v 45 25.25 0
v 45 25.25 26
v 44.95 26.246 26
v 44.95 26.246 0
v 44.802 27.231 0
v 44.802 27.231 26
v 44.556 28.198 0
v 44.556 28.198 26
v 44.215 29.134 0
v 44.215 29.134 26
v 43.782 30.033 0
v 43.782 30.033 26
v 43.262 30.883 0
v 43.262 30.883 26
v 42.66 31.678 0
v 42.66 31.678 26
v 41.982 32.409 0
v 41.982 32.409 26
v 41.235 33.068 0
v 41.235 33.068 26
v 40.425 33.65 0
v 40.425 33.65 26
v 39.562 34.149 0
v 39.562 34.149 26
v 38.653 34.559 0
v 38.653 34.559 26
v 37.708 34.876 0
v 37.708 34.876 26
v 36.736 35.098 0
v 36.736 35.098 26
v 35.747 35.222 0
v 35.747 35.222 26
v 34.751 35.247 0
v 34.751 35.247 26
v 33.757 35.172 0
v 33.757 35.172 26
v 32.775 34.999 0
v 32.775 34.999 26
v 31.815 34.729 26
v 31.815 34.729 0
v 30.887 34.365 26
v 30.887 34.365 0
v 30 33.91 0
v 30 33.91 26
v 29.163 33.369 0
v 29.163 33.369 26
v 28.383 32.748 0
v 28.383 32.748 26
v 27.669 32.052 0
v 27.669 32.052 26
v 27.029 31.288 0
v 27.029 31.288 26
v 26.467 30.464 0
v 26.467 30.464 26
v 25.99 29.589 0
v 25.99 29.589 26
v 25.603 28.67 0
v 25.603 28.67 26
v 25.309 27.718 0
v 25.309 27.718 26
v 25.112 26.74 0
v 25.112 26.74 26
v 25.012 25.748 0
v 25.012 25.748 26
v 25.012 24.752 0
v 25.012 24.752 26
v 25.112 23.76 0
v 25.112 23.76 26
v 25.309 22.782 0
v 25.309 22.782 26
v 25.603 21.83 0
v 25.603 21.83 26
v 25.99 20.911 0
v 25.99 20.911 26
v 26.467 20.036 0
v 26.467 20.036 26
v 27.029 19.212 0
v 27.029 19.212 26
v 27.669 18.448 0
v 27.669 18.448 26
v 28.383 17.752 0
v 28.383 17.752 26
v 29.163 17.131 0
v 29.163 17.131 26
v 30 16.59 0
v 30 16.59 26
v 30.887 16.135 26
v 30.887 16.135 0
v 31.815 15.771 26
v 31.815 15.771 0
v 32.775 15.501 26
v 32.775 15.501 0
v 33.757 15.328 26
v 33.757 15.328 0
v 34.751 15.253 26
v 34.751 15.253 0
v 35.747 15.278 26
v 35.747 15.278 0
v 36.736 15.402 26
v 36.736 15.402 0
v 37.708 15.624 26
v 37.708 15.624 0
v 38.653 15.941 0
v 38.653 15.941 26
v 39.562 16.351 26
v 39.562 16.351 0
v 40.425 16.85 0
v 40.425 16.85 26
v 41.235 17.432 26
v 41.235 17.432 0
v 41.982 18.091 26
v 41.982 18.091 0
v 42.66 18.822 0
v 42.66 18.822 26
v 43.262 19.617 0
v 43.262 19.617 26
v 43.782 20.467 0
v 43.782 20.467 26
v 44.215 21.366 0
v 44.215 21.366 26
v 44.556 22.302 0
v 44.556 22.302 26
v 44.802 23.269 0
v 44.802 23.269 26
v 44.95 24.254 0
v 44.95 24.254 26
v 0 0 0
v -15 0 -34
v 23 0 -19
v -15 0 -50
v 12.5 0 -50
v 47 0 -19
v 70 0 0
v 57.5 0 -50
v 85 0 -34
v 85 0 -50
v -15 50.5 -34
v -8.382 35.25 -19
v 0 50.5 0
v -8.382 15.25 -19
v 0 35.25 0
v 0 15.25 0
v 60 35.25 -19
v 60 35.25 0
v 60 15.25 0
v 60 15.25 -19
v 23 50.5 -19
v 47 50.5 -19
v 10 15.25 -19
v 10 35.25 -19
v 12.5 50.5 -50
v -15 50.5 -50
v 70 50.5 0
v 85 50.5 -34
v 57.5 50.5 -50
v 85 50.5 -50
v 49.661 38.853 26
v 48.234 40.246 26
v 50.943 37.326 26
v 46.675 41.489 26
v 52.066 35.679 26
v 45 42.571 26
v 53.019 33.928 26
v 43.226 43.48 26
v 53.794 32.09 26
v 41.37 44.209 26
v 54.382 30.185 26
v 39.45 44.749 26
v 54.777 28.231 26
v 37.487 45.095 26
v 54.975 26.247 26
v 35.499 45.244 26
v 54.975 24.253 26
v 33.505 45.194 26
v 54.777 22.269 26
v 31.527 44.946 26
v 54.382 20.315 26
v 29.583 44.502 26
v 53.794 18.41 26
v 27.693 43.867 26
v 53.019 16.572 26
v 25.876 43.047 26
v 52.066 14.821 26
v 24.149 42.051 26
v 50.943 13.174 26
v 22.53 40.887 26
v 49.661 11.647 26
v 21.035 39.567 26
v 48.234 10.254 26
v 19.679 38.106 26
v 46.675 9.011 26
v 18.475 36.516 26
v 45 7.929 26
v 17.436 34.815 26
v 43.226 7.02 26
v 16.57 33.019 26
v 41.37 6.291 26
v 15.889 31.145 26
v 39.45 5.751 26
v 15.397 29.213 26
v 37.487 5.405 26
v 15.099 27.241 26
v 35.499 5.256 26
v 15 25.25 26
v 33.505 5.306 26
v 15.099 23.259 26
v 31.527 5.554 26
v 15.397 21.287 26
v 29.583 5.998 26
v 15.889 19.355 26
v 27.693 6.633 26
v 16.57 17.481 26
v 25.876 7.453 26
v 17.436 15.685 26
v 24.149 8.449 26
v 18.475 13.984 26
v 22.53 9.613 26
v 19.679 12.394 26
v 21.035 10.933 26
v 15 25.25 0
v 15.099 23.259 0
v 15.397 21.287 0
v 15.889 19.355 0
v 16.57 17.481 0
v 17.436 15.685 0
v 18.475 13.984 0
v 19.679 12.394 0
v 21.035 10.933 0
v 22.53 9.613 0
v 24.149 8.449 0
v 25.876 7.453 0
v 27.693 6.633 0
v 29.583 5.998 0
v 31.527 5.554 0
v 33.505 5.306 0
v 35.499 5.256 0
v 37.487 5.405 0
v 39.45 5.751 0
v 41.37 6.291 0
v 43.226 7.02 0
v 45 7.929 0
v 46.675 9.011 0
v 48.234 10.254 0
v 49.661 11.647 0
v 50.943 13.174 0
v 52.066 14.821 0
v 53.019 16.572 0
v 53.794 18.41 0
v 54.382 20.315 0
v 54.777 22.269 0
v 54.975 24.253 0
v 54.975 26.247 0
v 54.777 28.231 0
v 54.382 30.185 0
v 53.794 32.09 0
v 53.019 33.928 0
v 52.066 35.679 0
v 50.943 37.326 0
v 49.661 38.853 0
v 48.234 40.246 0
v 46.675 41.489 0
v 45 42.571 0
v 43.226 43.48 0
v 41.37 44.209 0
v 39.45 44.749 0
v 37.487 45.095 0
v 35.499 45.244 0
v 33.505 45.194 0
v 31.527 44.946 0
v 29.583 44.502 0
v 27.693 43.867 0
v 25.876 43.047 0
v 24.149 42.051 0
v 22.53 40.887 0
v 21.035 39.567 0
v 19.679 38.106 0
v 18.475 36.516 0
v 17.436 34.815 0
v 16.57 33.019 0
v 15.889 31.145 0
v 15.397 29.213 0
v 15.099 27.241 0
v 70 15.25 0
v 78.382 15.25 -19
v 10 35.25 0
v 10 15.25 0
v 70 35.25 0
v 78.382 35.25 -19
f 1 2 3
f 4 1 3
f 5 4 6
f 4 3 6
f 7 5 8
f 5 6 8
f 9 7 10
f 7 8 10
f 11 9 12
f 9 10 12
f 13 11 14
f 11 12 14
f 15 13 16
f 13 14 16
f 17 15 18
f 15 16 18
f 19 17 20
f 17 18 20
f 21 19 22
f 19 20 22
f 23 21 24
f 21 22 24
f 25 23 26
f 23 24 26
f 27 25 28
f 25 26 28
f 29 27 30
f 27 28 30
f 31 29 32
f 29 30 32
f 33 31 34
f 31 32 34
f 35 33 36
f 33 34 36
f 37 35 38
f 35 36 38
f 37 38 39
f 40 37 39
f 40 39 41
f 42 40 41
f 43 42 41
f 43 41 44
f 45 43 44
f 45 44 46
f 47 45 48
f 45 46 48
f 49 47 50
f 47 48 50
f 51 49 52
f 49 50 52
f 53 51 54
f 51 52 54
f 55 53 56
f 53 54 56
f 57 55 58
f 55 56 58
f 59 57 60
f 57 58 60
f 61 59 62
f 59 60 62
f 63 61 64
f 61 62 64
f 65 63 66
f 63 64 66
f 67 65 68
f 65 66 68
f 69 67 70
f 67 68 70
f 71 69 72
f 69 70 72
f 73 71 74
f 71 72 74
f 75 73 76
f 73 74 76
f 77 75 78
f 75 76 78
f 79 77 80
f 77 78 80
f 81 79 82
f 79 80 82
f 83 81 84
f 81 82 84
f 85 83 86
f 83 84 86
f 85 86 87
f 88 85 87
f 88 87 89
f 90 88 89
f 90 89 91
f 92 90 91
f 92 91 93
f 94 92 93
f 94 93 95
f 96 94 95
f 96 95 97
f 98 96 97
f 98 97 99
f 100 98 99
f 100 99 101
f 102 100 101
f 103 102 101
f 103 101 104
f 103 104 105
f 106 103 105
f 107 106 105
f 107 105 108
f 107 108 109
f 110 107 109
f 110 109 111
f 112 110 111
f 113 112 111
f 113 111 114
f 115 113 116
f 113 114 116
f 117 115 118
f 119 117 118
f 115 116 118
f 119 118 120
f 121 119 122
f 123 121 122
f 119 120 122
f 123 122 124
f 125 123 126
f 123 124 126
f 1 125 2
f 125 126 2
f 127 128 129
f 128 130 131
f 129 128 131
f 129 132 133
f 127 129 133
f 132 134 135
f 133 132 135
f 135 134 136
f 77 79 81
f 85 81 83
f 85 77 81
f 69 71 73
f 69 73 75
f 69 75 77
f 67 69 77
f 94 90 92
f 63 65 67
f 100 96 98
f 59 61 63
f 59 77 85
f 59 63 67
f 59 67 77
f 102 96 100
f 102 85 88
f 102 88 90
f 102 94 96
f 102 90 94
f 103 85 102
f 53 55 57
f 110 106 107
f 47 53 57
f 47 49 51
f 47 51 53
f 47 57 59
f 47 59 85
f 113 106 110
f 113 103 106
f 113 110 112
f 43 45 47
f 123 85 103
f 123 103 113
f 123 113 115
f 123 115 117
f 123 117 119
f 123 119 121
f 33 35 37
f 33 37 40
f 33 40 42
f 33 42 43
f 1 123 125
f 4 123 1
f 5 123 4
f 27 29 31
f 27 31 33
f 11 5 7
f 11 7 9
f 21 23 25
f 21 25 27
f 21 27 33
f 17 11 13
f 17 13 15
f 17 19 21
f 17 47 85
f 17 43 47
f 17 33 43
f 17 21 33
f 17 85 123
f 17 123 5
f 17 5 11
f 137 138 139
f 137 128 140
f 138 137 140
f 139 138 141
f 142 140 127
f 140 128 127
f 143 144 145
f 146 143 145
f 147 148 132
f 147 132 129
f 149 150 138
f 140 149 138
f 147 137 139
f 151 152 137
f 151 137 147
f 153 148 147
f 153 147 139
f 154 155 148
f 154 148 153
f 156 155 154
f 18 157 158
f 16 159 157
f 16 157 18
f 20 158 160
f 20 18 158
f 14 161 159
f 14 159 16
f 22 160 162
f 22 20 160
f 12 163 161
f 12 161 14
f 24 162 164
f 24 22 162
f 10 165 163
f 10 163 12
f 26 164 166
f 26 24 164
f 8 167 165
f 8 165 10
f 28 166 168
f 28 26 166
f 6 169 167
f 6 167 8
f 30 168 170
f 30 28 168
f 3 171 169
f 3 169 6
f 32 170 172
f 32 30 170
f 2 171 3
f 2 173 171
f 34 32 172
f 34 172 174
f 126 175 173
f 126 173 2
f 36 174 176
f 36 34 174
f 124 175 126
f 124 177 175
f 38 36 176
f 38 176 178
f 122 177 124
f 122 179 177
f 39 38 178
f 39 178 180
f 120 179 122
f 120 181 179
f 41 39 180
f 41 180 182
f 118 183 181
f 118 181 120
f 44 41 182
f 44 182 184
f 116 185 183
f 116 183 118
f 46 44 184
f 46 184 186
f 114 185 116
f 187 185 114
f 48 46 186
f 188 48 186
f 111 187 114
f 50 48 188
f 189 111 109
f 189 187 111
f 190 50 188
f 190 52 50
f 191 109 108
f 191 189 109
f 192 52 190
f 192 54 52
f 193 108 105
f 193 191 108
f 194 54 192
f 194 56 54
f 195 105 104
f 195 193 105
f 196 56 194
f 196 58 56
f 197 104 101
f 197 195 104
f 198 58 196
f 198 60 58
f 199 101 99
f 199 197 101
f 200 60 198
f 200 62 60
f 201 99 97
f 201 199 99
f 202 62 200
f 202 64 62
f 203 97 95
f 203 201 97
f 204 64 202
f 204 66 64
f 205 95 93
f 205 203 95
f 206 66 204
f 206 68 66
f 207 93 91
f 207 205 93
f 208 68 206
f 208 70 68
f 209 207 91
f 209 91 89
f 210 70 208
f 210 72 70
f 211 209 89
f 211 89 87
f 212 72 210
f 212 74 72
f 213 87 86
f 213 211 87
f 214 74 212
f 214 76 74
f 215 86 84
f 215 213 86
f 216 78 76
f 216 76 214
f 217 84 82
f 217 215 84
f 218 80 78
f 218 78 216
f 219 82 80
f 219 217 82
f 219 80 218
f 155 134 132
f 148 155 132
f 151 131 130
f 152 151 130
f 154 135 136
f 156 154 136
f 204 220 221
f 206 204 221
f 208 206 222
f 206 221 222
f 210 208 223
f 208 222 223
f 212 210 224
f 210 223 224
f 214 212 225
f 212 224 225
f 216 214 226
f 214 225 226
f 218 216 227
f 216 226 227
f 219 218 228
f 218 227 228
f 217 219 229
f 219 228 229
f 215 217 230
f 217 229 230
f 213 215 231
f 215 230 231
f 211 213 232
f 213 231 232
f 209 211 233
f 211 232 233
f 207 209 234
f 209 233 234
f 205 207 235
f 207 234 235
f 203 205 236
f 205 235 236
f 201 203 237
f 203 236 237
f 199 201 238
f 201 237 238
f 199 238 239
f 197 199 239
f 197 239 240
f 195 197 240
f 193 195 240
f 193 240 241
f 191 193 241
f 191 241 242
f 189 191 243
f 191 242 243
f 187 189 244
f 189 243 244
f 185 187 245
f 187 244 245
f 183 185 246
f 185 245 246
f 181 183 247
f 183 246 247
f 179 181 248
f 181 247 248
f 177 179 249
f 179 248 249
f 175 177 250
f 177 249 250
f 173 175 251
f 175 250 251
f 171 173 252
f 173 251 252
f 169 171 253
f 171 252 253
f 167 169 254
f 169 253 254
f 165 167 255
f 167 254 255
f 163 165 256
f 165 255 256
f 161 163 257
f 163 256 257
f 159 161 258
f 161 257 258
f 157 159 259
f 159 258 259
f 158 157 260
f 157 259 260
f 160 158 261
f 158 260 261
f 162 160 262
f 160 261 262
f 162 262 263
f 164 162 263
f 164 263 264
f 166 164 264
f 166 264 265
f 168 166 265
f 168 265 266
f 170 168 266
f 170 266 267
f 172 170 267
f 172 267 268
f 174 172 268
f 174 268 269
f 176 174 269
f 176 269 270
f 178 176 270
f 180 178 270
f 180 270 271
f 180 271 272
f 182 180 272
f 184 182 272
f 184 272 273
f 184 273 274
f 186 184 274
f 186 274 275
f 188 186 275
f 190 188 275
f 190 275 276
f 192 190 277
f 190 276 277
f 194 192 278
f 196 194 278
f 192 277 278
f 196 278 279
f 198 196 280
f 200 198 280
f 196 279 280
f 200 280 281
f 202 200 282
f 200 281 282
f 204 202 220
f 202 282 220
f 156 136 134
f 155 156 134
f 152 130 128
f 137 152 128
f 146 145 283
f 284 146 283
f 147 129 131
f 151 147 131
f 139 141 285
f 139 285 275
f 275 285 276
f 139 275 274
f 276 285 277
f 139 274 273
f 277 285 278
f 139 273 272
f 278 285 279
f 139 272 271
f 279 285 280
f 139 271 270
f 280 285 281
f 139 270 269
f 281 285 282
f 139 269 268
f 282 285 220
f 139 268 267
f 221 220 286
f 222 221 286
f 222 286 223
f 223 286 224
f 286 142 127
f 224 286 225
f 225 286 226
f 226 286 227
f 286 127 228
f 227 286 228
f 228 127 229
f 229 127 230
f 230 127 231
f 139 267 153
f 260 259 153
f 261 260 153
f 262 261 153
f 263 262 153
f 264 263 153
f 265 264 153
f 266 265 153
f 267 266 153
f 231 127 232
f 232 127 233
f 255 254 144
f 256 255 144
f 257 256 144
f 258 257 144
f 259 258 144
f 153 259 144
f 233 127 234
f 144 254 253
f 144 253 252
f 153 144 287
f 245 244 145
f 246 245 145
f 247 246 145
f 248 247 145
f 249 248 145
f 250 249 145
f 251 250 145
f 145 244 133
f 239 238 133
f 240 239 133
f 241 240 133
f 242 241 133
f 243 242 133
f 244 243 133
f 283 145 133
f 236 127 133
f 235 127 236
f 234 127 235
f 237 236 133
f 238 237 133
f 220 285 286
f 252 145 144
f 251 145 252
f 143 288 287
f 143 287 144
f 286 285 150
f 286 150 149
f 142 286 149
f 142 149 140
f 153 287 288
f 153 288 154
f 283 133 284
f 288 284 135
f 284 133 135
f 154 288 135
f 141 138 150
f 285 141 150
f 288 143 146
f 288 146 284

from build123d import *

# Parameters (mm, degrees)
BOSS_EXTRUDE3_DEPTH = 50.5
SKETCH6_R           = 20
BOSS_EXTRUDE4_DEPTH = 26
SKETCH7_R           = 10
CUT_EXTRUDE1_DEPTH  = 26
CUT_EXTRUDE2_DEPTH  = 19


with BuildPart() as part:
    # Sketch4 → Boss-Extrude3 (new body)
    with BuildSketch(Plane(origin=(0, 0, 0), x_dir=(1, 0, 0), z_dir=(0, 1, 0))):
        Polygon((0, 0), (70, 0), (85, 34), (85, 50), (57.5, 50), (47, 19), (23, 19), (12.5, 50), (-15, 50), (-15, 34), align=None)
    extrude(amount=BOSS_EXTRUDE3_DEPTH)

    # Sketch6 → Boss-Extrude4 (add)
    with BuildSketch(Plane.XY):
        with Locations(Location((35, 25.25, 0), (0, 0, 180))):
            Circle(SKETCH6_R)
    extrude(amount=BOSS_EXTRUDE4_DEPTH)

    # Sketch7 → Cut-Extrude1 (cut)
    with BuildSketch(Plane.XY.offset(26)):
        with Locations((35, 25.25)):
            Circle(SKETCH7_R)
    extrude(amount=-CUT_EXTRUDE1_DEPTH, mode=Mode.SUBTRACT)

    # Sketch8 → Cut-Extrude2 (cut)
    with BuildSketch(Plane.XY):
        Polygon((80, 25.855466689), (80, 35.25), (60, 35.25), (60, 15.25), (80, 15.25), align=None)
        Polygon((-10, 25.855466689), (-10, 35.25), (10, 35.25), (10, 15.25), (-10, 15.25), align=None)
    extrude(amount=-CUT_EXTRUDE2_DEPTH, mode=Mode.SUBTRACT)


solid = part.part
